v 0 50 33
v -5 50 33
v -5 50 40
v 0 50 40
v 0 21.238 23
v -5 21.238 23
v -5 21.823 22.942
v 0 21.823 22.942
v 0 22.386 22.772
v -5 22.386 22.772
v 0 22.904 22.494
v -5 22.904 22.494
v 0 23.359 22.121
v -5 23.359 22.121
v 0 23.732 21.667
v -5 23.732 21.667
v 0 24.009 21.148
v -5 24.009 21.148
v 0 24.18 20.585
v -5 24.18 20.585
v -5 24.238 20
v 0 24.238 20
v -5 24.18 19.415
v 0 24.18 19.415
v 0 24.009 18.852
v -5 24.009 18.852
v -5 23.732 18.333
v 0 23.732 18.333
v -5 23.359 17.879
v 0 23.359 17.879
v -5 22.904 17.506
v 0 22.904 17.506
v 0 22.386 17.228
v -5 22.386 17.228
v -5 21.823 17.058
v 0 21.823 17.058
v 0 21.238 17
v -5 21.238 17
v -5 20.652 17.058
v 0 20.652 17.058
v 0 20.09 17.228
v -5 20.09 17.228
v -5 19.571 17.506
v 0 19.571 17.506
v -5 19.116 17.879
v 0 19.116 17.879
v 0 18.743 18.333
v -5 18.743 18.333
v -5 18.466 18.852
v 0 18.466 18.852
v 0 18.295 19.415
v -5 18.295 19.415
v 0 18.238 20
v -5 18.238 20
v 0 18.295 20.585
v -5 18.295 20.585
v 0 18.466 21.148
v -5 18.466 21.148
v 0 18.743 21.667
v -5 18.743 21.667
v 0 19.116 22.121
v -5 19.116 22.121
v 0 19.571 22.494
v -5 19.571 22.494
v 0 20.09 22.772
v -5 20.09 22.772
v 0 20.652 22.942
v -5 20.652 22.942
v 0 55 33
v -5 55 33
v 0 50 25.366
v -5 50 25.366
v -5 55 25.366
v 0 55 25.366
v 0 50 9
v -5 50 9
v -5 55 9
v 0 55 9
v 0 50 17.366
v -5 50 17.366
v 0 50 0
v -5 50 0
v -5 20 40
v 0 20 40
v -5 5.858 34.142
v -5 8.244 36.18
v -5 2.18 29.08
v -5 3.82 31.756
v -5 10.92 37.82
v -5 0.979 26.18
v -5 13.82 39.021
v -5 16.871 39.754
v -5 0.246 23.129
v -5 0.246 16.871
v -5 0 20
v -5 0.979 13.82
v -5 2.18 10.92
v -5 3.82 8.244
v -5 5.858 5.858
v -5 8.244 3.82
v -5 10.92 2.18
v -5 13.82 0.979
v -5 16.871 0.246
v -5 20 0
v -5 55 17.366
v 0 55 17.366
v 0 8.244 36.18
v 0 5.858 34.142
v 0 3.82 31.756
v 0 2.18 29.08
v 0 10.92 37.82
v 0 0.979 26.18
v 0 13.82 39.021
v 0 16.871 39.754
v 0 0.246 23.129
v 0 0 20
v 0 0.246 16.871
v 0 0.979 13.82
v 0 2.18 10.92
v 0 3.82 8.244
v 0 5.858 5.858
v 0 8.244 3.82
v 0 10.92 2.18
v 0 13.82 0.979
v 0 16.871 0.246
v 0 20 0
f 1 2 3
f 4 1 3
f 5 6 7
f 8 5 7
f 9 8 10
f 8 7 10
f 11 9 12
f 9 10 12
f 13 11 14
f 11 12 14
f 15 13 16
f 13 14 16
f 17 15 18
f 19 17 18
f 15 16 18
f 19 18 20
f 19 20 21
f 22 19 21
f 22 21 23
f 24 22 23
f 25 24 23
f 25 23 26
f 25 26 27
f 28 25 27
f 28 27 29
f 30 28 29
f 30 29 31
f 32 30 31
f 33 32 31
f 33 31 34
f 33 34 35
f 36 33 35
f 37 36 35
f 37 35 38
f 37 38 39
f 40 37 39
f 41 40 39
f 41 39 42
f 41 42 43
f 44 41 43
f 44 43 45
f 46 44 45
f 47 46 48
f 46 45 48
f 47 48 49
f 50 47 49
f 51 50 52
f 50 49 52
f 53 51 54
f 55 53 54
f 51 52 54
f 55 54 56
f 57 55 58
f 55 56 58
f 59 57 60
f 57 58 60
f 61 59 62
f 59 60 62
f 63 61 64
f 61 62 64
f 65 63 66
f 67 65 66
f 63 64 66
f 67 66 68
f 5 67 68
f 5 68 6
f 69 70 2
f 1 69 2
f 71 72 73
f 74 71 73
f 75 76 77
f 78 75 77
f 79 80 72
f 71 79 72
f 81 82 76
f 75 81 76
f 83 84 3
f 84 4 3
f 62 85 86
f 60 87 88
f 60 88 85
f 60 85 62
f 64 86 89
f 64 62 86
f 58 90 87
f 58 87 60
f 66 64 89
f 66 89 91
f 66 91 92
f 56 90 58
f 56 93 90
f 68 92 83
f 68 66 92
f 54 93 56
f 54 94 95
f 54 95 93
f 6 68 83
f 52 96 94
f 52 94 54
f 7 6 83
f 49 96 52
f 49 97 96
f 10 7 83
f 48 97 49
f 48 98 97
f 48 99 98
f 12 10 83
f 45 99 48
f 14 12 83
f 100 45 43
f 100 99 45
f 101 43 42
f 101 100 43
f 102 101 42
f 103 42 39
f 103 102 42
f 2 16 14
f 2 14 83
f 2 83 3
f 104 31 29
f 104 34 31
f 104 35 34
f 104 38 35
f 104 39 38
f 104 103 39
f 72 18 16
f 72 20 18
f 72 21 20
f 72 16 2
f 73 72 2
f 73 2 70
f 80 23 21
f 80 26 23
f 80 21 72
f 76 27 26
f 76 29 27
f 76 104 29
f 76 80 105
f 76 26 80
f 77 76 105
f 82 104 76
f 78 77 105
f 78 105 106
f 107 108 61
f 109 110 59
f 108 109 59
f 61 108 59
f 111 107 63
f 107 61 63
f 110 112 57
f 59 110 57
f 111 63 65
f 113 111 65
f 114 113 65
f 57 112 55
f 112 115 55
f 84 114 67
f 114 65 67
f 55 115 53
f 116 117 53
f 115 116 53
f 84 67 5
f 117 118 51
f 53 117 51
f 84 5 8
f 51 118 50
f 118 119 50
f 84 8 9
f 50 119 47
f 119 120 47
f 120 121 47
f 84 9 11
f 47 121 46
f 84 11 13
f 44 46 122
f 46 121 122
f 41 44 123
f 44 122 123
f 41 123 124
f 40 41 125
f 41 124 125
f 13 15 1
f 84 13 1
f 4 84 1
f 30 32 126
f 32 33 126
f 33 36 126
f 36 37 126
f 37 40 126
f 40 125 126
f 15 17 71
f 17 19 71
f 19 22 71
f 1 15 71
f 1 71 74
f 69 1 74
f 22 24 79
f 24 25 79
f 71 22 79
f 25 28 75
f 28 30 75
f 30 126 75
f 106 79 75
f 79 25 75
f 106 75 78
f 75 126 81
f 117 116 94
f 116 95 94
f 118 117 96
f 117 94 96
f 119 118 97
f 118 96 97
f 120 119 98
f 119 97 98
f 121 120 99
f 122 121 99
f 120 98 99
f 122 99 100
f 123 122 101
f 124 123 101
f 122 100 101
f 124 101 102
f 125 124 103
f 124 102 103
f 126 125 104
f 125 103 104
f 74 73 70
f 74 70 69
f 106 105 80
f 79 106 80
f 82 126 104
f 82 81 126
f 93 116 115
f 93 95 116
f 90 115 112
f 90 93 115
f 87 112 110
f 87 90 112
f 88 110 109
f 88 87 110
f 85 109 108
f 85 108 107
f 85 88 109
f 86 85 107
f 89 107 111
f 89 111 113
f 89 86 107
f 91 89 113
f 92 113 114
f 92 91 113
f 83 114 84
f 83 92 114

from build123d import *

# Parameters (mm, degrees)
DODANIE_WYCI_GNI_CIE1_DEPTH = 40
ZAOKR_GLENIE1_R             = 20
SZKIC6_R                    = 3
WYTNIJ_WYCI_GNI_CIE1_DEPTH  = 10
WYTNIJ_WYCI_GNI_CIE2_DEPTH  = 69.190908485


with BuildPart() as part:
    # Szkic1 → Dodanie-wyciągnięcie1 (new body)
    with BuildSketch(Plane.XY):
        Polygon((0, 0), (-5, 0), (-5, 55), (0, 55), (0, 51.5), align=None)
    extrude(amount=DODANIE_WYCI_GNI_CIE1_DEPTH)

    # Zaokrąglenie1
    zaokr_glenie1_edges = [part.edges().sort_by_distance(p)[0] for p in [
        (-2.5, 0, 0),
        (-2.5, 0, 40),
    ]]
    fillet(zaokr_glenie1_edges, radius=ZAOKR_GLENIE1_R - 0.0001)  # a hair under: the kernel refuses the full size

    # Szkic6 → Wytnij-wyciągnięcie1 (cut)
    with BuildSketch(Plane.ZY.offset(5)):
        with Locations((20, 21.237598079)):
            Circle(SZKIC6_R)
    extrude(amount=-WYTNIJ_WYCI_GNI_CIE1_DEPTH, mode=Mode.SUBTRACT)

    # Szkic8 → Wytnij-wyciągnięcie2 (cut, through all)
    with BuildSketch(Plane.ZY.offset(5)):
        Polygon((0, 50), (9, 50), (9, 55), (17.366037593, 55), (17.366037593, 50), (25.366037593, 50), (25.366037593, 55), (33, 55), (33, 50), (40, 50), (40, 57.074314744), (0, 57.074314744), align=None)
    extrude(amount=-WYTNIJ_WYCI_GNI_CIE2_DEPTH, mode=Mode.SUBTRACT)


solid = part.part
